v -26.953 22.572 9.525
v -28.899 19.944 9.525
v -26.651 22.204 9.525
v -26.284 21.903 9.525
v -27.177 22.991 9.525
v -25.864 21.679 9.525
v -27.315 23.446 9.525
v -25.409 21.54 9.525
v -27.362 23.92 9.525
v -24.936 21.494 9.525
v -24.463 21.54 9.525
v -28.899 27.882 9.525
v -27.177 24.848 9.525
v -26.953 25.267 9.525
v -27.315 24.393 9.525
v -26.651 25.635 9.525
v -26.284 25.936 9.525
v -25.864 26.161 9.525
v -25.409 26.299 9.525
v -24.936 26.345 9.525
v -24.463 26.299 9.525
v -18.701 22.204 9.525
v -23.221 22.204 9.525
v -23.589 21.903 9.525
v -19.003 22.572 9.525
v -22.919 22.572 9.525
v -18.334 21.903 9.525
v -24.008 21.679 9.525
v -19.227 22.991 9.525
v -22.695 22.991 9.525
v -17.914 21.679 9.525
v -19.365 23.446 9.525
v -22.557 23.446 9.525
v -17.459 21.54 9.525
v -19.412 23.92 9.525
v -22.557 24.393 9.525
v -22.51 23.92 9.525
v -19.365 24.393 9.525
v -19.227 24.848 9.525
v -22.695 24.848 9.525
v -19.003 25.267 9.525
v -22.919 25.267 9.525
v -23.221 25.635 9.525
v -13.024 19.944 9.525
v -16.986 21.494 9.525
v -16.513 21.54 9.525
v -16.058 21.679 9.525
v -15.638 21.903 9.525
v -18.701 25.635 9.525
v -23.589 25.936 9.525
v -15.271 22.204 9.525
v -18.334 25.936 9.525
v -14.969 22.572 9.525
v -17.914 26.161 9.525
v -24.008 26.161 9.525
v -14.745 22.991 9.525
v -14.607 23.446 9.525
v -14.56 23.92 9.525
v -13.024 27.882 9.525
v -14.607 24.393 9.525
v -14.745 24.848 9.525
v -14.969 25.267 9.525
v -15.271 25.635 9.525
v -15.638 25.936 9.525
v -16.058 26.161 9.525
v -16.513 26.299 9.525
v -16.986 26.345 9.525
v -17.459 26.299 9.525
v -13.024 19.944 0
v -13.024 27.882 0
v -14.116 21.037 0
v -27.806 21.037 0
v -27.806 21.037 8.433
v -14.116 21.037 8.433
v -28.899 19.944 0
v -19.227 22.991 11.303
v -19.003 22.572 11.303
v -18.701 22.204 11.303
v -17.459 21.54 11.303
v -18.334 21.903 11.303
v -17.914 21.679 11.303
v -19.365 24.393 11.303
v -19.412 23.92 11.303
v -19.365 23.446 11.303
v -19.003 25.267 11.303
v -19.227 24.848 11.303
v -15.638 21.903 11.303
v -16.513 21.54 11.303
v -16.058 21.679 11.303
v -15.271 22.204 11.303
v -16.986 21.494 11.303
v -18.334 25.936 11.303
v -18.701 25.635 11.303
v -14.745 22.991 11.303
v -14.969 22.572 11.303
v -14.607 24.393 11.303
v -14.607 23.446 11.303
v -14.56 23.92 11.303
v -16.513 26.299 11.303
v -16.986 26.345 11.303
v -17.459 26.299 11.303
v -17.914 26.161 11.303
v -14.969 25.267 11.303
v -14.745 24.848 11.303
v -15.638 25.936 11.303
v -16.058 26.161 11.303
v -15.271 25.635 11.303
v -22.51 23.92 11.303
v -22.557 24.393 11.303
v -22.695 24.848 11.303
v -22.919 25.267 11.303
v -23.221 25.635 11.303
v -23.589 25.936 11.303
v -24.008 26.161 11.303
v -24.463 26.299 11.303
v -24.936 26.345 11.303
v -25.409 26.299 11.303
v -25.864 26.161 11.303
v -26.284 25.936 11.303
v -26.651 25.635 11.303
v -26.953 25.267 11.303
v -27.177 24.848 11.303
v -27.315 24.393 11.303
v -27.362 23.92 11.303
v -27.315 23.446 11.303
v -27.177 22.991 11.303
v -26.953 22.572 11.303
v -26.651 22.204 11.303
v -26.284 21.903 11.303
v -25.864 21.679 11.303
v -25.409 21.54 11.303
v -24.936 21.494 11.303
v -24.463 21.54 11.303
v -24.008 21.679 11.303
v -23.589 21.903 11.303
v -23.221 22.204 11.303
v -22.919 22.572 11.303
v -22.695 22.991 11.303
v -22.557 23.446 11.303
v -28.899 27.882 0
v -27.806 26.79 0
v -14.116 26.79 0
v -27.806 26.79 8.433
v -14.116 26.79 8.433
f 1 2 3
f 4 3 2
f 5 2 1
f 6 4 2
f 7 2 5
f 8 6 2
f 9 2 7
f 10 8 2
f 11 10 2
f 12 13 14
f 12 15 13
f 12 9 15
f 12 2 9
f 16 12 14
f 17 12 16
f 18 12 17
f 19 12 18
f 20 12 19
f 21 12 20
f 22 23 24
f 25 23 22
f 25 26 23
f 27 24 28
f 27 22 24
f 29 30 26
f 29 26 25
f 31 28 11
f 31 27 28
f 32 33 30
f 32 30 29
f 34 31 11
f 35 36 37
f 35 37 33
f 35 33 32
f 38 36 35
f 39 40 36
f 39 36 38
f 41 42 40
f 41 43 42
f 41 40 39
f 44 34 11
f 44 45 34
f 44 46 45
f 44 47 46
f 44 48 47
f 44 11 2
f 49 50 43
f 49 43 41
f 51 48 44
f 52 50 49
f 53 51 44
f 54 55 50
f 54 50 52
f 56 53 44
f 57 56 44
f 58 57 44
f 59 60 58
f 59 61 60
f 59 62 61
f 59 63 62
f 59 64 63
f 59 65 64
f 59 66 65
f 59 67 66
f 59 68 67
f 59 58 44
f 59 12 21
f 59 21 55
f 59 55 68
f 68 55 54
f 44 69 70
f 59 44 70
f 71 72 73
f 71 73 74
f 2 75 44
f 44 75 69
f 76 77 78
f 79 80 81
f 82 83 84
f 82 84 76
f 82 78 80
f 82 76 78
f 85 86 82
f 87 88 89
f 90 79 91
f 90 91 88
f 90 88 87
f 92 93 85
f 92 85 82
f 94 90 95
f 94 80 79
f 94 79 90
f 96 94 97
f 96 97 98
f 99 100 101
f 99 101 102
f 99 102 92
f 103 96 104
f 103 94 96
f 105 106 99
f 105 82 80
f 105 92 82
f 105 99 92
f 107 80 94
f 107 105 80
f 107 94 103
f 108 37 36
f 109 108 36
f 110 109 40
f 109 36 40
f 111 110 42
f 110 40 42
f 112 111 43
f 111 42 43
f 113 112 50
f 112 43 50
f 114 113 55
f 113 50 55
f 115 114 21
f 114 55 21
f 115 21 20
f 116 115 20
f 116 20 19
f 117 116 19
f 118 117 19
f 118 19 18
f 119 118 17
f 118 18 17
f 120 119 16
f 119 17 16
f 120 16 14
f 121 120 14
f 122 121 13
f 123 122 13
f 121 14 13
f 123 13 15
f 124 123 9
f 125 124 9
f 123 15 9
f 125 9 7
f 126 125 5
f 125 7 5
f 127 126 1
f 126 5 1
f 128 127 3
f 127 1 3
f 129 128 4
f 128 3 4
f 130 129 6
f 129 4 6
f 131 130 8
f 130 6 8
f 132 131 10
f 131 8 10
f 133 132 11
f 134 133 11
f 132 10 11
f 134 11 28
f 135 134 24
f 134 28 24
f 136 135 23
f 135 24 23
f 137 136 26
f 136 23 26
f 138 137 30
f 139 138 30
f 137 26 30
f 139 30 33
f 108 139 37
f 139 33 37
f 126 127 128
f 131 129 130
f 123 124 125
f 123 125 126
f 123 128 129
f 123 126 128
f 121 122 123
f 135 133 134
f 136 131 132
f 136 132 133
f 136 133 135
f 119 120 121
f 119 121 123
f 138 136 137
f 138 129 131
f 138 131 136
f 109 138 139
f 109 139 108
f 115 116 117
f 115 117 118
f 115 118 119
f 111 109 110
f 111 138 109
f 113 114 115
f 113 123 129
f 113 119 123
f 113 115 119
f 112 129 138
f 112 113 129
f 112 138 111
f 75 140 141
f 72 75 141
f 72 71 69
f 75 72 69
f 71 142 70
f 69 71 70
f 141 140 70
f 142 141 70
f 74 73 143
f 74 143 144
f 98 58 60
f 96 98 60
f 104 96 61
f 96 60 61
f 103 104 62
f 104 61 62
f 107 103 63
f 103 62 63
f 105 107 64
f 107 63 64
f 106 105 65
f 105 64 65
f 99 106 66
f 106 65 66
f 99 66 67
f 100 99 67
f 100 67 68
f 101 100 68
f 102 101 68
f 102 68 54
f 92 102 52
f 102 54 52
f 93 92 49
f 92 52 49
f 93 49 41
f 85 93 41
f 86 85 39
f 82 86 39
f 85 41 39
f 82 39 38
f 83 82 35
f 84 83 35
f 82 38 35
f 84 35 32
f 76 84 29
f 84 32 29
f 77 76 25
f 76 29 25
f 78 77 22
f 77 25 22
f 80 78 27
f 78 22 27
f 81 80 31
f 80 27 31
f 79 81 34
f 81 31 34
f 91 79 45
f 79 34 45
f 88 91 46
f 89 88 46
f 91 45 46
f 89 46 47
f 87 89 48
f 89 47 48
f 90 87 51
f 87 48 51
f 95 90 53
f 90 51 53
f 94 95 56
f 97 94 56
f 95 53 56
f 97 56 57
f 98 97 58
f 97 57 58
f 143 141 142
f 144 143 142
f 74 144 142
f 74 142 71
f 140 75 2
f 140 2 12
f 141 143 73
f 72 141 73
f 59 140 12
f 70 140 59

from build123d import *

# Parameters (mm, degrees)
F0_W     = 15.875
F0_H     = 7.9375
F1_DEPTH = 9.525
F2_R     = 2.4257
F4_DEPTH = 1.778
F3_R     = 2.4257
F5_DEPTH = 1.778
F6_W     = 13.6906
F6_H     = 5.7531
F7_DEPTH = 8.4328


with BuildPart() as f1:
    # F0 (on Top) → F1 (new body)
    with BuildSketch(Plane.XY):
        with Locations((-20.961086, 23.913214)):
            Rectangle(F0_W, F0_H)
    extrude(amount=F1_DEPTH)

    # F2 (on face) → F4 (join)
    with BuildSketch(Plane.XY.offset(9.525)):
        with Locations((-24.936186, 23.919564)):
            Circle(F2_R)
    extrude(amount=F4_DEPTH)

    # F3 (on face) → F5 (join)
    with BuildSketch(Plane.XY.offset(9.525)):
        with Locations((-16.985986, 23.919564)):
            Circle(F3_R)
    extrude(amount=F5_DEPTH)

    # F6 (on face) → F7 (cut)
    with BuildSketch(Plane(origin=(0, 0, 0), x_dir=(1, 0, 0), z_dir=(0, 0, -1))):
        with Locations((-20.961086, -23.913214)):
            Rectangle(F6_W, F6_H)
    extrude(amount=-F7_DEPTH, mode=Mode.SUBTRACT)


solid = f1.part
